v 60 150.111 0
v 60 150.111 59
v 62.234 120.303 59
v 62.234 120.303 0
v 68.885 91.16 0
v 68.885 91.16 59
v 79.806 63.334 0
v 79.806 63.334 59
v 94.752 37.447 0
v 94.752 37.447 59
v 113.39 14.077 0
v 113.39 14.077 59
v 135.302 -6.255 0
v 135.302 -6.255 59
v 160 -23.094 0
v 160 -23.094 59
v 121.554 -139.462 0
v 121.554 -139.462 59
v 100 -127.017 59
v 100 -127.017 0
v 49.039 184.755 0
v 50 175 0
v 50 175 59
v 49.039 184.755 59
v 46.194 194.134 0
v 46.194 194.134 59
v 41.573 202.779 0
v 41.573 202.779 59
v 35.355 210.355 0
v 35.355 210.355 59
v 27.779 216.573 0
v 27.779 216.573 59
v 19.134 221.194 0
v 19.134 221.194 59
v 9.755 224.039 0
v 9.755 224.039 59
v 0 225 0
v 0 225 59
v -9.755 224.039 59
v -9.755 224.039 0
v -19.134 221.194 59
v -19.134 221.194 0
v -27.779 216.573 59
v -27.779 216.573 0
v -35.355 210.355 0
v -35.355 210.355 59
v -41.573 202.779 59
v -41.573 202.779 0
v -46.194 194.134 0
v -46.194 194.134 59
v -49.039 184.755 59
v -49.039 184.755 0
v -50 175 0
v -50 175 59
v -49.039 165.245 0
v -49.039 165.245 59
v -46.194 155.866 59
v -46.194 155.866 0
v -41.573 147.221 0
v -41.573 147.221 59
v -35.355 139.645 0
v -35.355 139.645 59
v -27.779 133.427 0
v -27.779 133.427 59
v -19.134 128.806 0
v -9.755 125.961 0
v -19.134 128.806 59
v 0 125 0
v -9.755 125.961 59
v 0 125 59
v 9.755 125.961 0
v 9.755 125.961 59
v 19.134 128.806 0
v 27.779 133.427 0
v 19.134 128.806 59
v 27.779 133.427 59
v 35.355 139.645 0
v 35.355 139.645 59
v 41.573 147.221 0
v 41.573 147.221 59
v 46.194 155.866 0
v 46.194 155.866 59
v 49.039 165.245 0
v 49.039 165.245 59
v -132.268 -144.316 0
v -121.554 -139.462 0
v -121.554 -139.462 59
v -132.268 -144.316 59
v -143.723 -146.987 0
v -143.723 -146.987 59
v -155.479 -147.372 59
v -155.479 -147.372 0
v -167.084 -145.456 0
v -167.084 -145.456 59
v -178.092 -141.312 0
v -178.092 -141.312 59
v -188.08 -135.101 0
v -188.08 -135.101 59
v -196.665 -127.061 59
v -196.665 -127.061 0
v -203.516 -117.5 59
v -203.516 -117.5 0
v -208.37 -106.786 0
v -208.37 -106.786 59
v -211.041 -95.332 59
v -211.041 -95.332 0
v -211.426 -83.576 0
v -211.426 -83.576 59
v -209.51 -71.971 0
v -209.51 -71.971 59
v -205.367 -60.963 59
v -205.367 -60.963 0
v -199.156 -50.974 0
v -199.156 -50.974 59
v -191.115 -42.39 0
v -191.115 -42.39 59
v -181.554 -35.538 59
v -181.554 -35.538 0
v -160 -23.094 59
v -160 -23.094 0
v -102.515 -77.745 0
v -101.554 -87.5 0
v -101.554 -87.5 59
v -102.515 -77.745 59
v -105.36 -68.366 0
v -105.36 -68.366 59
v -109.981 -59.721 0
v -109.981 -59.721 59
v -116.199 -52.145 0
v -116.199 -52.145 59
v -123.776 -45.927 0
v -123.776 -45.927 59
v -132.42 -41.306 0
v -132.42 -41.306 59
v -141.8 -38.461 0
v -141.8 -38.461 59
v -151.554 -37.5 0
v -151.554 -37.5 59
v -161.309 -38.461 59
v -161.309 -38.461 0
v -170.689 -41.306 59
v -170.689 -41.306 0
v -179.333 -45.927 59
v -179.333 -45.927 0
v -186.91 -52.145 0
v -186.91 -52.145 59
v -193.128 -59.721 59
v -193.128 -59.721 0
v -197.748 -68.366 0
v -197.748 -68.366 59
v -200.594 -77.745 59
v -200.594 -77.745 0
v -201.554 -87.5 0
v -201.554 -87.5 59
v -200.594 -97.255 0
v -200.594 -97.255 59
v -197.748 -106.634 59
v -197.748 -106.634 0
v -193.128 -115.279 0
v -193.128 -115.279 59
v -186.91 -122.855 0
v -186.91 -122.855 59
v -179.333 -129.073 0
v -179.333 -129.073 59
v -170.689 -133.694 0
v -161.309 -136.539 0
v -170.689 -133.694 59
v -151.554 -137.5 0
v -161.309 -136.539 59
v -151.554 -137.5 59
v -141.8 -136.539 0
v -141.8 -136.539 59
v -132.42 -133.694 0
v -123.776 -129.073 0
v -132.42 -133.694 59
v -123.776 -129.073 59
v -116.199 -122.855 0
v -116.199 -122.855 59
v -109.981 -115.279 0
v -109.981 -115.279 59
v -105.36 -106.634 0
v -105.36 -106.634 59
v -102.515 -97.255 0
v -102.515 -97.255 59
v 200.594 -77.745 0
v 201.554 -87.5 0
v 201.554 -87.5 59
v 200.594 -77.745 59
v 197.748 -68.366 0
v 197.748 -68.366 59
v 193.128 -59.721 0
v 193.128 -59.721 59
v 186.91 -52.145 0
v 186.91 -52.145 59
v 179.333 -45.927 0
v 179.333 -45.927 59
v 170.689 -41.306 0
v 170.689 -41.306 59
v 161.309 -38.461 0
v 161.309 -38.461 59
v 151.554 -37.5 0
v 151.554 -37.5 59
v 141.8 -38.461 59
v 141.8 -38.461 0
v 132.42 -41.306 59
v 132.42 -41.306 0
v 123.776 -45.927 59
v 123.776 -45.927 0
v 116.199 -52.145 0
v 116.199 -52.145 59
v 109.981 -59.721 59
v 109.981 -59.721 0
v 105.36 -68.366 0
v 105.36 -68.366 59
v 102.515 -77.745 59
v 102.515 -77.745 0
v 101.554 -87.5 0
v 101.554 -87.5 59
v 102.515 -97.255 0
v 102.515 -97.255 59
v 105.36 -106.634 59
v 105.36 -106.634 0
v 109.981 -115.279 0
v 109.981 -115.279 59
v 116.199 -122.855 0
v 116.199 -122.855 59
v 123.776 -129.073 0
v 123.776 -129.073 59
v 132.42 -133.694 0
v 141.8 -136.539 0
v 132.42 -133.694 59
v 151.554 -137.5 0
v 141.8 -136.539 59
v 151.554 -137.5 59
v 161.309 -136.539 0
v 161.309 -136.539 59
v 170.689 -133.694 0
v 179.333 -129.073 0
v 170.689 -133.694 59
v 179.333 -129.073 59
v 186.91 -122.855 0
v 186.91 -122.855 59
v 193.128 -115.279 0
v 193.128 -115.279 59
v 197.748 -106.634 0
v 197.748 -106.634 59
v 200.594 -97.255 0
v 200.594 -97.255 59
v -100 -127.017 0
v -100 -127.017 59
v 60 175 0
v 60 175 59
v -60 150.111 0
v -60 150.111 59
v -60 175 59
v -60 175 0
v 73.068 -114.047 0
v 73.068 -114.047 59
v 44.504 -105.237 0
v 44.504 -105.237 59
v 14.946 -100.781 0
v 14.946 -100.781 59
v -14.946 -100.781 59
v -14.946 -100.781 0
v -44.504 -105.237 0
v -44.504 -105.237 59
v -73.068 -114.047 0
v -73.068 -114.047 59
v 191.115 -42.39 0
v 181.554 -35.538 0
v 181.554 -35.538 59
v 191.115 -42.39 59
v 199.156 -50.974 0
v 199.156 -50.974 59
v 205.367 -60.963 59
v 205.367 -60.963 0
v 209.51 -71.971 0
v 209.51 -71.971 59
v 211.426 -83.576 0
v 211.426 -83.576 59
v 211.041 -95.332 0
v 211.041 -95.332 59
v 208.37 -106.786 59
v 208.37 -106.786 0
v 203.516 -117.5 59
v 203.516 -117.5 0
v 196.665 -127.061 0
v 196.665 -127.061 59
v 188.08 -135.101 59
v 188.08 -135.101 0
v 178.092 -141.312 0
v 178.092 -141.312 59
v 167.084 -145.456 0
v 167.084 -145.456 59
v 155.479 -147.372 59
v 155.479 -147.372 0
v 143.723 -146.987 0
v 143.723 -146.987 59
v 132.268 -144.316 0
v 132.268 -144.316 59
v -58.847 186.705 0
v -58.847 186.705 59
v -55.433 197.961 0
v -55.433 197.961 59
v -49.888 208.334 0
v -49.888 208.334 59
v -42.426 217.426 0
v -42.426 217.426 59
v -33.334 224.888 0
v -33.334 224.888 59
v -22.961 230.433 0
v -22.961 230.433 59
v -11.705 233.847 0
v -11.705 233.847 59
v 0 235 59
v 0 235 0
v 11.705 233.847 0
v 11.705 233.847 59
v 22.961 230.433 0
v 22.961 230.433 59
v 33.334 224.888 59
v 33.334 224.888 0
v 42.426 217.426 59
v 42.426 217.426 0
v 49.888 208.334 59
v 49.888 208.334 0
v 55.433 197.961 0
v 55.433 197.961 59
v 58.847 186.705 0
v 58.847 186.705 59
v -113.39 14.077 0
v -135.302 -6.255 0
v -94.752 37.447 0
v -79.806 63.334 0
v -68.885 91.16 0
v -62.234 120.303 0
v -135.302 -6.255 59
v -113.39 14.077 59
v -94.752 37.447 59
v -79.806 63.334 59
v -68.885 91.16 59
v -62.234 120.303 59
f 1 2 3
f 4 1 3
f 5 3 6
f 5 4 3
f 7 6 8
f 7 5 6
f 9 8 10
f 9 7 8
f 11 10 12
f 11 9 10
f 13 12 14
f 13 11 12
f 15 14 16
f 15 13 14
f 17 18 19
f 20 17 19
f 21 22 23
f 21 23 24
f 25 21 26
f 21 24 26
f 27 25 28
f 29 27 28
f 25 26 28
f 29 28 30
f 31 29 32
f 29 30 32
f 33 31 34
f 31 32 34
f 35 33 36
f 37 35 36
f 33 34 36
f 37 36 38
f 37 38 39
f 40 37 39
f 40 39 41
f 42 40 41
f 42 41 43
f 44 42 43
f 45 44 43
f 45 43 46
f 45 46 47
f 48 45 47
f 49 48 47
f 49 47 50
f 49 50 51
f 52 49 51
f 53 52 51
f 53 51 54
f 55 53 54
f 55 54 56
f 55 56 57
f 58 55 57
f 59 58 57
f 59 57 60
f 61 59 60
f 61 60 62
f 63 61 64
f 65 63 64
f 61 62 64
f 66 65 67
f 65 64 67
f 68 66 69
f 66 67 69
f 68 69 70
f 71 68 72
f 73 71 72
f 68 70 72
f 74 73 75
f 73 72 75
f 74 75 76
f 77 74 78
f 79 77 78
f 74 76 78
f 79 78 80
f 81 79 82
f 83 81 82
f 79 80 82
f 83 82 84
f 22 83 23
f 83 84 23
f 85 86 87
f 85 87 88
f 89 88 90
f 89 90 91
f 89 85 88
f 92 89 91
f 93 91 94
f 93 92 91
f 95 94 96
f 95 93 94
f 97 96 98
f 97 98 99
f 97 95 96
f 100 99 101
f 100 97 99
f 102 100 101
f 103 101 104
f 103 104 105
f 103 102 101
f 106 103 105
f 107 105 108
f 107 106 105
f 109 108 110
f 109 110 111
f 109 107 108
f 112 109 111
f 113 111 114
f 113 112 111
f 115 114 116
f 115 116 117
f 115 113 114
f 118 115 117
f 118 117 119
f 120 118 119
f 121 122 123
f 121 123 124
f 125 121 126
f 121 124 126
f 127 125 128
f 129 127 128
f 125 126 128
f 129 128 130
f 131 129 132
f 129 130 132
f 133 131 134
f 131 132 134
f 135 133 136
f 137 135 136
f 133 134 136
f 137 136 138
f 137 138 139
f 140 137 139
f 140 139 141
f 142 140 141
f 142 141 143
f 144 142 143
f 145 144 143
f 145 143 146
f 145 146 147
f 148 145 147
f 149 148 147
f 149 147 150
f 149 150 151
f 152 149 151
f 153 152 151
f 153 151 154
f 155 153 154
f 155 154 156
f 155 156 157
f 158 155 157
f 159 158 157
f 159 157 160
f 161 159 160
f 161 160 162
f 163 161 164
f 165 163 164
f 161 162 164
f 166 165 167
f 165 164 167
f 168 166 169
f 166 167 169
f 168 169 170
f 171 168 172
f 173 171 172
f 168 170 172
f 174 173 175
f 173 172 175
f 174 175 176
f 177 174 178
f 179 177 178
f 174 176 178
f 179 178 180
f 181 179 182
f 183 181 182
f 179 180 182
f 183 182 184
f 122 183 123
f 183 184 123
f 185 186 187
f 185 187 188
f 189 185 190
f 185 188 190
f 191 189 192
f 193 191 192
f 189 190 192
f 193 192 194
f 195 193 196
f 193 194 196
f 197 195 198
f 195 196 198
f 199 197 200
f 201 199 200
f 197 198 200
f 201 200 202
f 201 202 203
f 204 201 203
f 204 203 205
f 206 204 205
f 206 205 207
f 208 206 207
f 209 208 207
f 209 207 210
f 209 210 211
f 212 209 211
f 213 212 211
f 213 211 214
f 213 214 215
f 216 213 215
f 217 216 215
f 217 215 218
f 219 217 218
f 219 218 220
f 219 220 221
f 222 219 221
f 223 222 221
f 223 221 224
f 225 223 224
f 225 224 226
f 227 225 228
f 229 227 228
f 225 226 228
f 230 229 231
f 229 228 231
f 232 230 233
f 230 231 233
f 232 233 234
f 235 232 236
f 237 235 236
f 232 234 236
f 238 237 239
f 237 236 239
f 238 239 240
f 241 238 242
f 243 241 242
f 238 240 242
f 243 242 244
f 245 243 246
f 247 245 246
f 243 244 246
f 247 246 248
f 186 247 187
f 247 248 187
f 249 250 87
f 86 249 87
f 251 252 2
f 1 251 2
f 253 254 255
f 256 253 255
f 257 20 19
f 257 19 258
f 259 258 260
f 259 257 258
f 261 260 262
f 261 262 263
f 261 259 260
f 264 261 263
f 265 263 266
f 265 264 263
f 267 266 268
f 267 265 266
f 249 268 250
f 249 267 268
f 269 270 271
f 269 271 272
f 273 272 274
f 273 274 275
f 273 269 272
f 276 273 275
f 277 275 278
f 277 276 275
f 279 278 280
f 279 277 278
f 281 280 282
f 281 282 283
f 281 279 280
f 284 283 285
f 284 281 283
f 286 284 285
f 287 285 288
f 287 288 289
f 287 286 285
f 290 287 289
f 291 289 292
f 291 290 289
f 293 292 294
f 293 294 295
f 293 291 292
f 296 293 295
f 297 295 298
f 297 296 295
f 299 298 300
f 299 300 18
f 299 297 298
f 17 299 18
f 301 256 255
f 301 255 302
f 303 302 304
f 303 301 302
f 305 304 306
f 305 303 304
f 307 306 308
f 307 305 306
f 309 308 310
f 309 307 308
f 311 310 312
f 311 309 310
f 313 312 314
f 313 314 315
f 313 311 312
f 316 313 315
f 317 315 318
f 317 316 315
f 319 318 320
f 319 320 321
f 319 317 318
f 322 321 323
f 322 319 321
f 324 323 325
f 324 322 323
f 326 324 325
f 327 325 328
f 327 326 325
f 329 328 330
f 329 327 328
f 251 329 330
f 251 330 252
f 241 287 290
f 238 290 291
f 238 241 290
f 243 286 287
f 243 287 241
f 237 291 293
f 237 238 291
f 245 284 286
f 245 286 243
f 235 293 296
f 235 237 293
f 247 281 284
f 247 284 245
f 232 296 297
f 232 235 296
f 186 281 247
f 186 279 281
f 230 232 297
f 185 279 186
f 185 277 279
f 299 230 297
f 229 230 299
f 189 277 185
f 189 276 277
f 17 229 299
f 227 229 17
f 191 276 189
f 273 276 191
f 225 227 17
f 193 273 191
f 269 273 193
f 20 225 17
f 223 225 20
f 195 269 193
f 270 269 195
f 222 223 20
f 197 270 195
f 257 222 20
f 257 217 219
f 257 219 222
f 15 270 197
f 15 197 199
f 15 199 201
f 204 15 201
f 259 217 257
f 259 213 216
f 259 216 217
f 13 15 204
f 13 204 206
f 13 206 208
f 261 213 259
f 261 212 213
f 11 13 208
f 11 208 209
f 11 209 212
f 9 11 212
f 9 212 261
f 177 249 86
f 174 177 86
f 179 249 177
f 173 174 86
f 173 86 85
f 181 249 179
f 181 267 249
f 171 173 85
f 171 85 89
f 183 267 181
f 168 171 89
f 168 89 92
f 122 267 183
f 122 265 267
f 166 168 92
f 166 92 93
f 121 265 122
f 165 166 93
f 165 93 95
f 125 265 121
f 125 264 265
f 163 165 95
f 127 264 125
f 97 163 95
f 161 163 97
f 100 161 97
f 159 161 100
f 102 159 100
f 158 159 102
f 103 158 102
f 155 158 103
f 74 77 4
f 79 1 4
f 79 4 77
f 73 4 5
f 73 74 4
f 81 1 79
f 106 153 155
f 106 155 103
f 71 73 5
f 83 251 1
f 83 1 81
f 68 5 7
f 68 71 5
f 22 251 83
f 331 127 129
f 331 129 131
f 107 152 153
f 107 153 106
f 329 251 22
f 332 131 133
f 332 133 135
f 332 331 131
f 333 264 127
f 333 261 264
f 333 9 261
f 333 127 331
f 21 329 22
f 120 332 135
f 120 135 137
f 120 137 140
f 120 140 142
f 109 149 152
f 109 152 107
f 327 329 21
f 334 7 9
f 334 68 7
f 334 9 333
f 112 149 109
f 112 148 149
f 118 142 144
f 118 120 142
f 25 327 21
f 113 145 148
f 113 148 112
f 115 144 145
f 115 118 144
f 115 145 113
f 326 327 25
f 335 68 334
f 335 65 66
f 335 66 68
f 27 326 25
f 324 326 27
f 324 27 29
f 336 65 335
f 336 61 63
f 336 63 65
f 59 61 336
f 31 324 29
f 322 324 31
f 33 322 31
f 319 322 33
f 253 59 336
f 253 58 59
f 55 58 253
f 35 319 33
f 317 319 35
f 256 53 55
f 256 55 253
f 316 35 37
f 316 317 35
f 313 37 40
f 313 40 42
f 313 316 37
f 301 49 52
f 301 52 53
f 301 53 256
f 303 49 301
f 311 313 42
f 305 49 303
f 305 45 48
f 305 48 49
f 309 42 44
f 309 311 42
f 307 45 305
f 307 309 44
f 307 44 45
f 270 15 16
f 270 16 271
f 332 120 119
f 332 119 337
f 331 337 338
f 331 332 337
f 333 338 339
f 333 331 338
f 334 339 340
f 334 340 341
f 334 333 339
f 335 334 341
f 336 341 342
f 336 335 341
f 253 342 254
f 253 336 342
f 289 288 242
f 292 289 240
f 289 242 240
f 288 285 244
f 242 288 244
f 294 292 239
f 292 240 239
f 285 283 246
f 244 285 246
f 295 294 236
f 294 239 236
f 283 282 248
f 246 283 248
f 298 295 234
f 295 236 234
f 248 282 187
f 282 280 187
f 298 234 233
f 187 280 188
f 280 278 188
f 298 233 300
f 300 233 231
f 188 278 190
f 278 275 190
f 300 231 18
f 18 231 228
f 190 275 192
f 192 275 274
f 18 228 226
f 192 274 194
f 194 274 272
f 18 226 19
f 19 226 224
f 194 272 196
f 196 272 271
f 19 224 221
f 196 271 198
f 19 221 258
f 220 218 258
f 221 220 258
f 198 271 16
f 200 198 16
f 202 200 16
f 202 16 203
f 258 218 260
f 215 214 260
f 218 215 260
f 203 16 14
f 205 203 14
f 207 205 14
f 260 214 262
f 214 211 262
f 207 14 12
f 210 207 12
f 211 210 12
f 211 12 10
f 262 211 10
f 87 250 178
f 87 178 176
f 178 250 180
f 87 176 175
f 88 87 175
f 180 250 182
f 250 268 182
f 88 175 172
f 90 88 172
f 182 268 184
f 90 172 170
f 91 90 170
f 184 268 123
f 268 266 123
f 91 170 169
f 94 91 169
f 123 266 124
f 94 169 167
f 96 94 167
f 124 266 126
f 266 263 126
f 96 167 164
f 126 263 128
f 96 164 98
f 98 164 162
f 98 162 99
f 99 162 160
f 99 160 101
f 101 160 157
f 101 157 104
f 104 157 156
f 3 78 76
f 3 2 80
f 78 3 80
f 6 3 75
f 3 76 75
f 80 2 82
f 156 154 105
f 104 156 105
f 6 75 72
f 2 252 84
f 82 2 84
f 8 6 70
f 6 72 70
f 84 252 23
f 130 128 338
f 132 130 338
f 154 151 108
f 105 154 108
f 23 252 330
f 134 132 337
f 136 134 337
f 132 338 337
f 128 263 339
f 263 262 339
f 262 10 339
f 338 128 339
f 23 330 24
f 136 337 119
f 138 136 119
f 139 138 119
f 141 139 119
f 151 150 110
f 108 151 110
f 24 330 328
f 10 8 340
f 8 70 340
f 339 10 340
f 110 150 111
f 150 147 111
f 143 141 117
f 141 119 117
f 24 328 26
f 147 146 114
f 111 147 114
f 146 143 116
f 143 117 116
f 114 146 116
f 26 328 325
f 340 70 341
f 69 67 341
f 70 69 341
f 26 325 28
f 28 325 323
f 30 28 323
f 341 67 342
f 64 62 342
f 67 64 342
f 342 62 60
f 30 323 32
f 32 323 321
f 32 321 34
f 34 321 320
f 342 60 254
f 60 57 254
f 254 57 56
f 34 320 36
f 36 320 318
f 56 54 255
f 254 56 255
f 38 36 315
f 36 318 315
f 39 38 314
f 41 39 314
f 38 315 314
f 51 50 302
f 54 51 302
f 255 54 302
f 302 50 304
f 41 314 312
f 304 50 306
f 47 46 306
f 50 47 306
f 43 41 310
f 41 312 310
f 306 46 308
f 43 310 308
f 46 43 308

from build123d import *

# Parameters (mm, degrees)
EXTRUDE_1_DEPTH     = 59
SKETCH_2_R          = 50
CUT_EXTRUDE_1_DEPTH = 322.653980979


with BuildPart() as part:
    # 草图1 → 凸台-拉伸1 (new body)
    with BuildSketch(Plane.XY):
        with BuildLine():
            Line((-60, 150.111069989), (-60, 175))
            ThreePointArc((-60, 175), (0, 235), (60, 175))
            Line((60, 175), (60, 150.111069989))
            ThreePointArc((60, 150.111069989), (86.794919243, 50.111069989), (160, -23.094010768))
            Line((160, -23.094010768), (181.554445662, -35.538475773))
            ThreePointArc((181.554445662, -35.538475773), (203.515969889, -117.5), (121.554445662, -139.461524227))
            Line((121.554445662, -139.461524227), (100, -127.017059222))
            ThreePointArc((100, -127.017059222), (0, -100.222139979), (-100, -127.017059222))
            Line((-100, -127.017059222), (-121.554445662, -139.461524227))
            ThreePointArc((-121.554445662, -139.461524227), (-203.515969889, -117.5), (-181.554445662, -35.538475773))
            Line((-181.554445662, -35.538475773), (-160, -23.094010768))
            ThreePointArc((-160, -23.094010768), (-86.794919243, 50.111069989), (-60, 150.111069989))
        make_face()
    extrude(amount=EXTRUDE_1_DEPTH)

    # 草图2 → 切除-拉伸1 (cut, through all)
    with BuildSketch(Plane.XY.offset(59)):
        with Locations((-151.554445662, -87.5)):
            Circle(SKETCH_2_R)
        with Locations((0, 175)):
            Circle(SKETCH_2_R)
        with Locations((151.554445662, -87.5)):
            Circle(SKETCH_2_R)
    extrude(amount=-CUT_EXTRUDE_1_DEPTH, mode=Mode.SUBTRACT)


solid = part.part
